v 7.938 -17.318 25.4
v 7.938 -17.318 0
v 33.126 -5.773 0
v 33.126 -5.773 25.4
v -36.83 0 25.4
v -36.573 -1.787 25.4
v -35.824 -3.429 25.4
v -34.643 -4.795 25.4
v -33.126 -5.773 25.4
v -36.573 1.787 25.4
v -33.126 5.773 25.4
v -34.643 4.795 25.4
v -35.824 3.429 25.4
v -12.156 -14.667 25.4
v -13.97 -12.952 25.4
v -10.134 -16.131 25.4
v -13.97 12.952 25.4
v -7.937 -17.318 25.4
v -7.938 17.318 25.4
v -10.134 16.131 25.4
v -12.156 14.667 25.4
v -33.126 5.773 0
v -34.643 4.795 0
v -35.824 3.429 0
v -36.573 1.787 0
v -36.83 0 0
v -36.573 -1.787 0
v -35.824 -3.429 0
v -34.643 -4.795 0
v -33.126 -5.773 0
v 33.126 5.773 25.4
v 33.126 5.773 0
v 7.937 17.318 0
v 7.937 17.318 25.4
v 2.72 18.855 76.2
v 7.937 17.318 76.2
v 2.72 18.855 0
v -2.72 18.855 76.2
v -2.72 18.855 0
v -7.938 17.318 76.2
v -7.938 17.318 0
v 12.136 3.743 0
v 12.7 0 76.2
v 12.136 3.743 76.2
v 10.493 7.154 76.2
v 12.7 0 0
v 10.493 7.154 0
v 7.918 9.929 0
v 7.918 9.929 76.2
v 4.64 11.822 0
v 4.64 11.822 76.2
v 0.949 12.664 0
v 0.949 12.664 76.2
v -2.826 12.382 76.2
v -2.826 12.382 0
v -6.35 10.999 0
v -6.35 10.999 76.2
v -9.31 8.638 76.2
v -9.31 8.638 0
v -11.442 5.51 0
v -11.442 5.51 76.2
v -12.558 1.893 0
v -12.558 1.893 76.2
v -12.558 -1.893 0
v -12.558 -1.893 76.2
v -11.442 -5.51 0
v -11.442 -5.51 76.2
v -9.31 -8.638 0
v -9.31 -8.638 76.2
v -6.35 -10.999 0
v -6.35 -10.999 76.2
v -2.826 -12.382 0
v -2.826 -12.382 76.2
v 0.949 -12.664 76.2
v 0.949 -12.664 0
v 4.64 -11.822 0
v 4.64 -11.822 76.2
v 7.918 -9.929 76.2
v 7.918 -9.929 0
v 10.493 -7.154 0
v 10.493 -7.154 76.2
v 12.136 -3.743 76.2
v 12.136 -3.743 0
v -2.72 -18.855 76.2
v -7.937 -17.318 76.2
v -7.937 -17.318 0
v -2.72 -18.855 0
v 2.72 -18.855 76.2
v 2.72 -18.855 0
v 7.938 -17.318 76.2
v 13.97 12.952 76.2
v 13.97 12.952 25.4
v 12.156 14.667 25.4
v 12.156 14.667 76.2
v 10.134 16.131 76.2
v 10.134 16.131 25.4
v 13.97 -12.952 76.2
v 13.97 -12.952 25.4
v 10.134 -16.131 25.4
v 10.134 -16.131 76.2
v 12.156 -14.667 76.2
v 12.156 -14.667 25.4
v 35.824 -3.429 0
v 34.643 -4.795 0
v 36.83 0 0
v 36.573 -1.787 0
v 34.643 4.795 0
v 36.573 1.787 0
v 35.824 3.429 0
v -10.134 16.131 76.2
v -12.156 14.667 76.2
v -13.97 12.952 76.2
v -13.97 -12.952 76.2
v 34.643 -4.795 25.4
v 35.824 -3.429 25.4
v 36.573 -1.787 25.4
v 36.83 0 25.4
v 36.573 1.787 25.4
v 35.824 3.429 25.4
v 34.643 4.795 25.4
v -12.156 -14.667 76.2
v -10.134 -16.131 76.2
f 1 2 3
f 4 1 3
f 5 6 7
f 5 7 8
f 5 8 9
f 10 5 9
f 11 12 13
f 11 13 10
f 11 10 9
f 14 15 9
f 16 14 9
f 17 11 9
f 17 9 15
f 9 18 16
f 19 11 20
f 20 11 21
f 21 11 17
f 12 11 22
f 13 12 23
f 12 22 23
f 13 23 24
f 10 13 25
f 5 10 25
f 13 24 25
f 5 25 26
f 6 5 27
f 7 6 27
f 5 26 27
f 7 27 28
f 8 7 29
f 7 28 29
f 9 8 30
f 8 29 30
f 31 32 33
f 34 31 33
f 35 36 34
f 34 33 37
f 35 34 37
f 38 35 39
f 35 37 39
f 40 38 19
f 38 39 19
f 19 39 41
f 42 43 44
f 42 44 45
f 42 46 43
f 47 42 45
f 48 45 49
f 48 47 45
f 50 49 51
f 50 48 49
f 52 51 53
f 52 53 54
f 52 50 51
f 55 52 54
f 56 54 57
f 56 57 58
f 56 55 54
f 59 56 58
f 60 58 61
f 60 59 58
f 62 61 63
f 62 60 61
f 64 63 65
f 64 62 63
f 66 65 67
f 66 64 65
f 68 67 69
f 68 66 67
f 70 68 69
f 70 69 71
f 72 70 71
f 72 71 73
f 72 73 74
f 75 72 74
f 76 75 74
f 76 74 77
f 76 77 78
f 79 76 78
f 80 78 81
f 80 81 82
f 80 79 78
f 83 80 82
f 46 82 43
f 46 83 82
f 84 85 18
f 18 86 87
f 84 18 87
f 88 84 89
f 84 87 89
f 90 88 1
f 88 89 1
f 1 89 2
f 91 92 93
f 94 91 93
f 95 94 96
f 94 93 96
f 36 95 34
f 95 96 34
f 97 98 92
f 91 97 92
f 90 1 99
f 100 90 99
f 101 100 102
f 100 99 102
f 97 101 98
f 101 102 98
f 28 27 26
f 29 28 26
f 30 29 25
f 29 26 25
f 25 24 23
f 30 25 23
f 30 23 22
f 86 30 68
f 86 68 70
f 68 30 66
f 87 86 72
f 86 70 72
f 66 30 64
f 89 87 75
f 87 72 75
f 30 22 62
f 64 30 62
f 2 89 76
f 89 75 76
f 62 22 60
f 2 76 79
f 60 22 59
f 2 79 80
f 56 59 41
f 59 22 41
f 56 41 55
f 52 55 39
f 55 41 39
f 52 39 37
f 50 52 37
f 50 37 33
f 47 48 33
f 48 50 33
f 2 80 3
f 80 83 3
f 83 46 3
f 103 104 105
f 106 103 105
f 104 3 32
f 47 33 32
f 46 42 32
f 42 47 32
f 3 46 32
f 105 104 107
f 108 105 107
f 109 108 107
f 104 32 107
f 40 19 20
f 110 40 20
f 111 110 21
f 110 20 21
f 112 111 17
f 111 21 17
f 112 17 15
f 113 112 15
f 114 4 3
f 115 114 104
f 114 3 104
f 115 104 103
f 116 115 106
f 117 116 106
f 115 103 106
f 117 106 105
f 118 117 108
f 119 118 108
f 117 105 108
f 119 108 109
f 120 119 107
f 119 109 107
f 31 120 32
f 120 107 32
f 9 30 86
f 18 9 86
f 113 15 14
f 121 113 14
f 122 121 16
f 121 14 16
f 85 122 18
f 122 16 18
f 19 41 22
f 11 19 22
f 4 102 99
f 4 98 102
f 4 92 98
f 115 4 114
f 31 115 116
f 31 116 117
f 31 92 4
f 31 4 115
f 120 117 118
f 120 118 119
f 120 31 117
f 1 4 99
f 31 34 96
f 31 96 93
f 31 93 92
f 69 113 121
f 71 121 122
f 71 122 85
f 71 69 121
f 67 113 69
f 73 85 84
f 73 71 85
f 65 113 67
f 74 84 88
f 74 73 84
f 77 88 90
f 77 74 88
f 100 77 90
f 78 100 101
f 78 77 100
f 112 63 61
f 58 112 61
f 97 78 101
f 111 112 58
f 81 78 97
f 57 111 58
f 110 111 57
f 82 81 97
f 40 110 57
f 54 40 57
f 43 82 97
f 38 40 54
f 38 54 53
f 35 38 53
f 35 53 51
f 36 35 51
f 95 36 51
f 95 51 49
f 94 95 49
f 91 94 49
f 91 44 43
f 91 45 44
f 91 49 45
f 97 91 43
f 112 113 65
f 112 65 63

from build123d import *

# Parameters (mm, degrees)
F0_R     = 12.7
F1_DEPTH = 25.4
F2_R     = 12.7
F3_DEPTH = 50.8


with BuildPart() as f1:
    # F0 (on Top) → F1 (new body)
    with BuildSketch(Plane.XY):
        with BuildLine():
            Line((-33.125833, -5.772527), (-7.9375, -17.31758))
            ThreePointArc((-7.9375, -17.31758), (0, -19.05), (7.9375, -17.31758))
            Line((7.9375, -17.31758), (33.125833, -5.772527))
            ThreePointArc((33.125833, -5.772527), (36.83, 0), (33.125833, 5.772527))
            Line((33.125833, 5.772527), (7.9375, 17.31758))
            ThreePointArc((7.9375, 17.31758), (0, 19.05), (-7.9375, 17.31758))
            Line((-7.9375, 17.31758), (-33.125833, 5.772527))
            ThreePointArc((-33.125833, 5.772527), (-36.83, 0), (-33.125833, -5.772527))
        make_face()
        Circle(F0_R, mode=Mode.SUBTRACT)
    extrude(amount=F1_DEPTH)

    # F2 (on face) → F3 (join)
    with BuildSketch(Plane.XY.offset(25.4)):
        with BuildLine():
            Line((13.97, -12.95151), (13.97, 12.95151))
            ThreePointArc((13.97, 12.95151), (11.169167, 15.432181), (7.9375, 17.31758))
            ThreePointArc((7.9375, 17.31758), (0, 19.05), (-7.9375, 17.31758))
            ThreePointArc((-7.9375, 17.31758), (-11.169167, 15.432181), (-13.97, 12.95151))
            Line((-13.97, 12.95151), (-13.97, -12.95151))
            ThreePointArc((-13.97, -12.95151), (-11.169167, -15.432181), (-7.9375, -17.31758))
            ThreePointArc((-7.9375, -17.31758), (0, -19.05), (7.9375, -17.31758))
            ThreePointArc((7.9375, -17.31758), (11.169167, -15.432181), (13.97, -12.95151))
        make_face()
        Circle(F2_R, mode=Mode.SUBTRACT)
    extrude(amount=F3_DEPTH)


solid = f1.part
